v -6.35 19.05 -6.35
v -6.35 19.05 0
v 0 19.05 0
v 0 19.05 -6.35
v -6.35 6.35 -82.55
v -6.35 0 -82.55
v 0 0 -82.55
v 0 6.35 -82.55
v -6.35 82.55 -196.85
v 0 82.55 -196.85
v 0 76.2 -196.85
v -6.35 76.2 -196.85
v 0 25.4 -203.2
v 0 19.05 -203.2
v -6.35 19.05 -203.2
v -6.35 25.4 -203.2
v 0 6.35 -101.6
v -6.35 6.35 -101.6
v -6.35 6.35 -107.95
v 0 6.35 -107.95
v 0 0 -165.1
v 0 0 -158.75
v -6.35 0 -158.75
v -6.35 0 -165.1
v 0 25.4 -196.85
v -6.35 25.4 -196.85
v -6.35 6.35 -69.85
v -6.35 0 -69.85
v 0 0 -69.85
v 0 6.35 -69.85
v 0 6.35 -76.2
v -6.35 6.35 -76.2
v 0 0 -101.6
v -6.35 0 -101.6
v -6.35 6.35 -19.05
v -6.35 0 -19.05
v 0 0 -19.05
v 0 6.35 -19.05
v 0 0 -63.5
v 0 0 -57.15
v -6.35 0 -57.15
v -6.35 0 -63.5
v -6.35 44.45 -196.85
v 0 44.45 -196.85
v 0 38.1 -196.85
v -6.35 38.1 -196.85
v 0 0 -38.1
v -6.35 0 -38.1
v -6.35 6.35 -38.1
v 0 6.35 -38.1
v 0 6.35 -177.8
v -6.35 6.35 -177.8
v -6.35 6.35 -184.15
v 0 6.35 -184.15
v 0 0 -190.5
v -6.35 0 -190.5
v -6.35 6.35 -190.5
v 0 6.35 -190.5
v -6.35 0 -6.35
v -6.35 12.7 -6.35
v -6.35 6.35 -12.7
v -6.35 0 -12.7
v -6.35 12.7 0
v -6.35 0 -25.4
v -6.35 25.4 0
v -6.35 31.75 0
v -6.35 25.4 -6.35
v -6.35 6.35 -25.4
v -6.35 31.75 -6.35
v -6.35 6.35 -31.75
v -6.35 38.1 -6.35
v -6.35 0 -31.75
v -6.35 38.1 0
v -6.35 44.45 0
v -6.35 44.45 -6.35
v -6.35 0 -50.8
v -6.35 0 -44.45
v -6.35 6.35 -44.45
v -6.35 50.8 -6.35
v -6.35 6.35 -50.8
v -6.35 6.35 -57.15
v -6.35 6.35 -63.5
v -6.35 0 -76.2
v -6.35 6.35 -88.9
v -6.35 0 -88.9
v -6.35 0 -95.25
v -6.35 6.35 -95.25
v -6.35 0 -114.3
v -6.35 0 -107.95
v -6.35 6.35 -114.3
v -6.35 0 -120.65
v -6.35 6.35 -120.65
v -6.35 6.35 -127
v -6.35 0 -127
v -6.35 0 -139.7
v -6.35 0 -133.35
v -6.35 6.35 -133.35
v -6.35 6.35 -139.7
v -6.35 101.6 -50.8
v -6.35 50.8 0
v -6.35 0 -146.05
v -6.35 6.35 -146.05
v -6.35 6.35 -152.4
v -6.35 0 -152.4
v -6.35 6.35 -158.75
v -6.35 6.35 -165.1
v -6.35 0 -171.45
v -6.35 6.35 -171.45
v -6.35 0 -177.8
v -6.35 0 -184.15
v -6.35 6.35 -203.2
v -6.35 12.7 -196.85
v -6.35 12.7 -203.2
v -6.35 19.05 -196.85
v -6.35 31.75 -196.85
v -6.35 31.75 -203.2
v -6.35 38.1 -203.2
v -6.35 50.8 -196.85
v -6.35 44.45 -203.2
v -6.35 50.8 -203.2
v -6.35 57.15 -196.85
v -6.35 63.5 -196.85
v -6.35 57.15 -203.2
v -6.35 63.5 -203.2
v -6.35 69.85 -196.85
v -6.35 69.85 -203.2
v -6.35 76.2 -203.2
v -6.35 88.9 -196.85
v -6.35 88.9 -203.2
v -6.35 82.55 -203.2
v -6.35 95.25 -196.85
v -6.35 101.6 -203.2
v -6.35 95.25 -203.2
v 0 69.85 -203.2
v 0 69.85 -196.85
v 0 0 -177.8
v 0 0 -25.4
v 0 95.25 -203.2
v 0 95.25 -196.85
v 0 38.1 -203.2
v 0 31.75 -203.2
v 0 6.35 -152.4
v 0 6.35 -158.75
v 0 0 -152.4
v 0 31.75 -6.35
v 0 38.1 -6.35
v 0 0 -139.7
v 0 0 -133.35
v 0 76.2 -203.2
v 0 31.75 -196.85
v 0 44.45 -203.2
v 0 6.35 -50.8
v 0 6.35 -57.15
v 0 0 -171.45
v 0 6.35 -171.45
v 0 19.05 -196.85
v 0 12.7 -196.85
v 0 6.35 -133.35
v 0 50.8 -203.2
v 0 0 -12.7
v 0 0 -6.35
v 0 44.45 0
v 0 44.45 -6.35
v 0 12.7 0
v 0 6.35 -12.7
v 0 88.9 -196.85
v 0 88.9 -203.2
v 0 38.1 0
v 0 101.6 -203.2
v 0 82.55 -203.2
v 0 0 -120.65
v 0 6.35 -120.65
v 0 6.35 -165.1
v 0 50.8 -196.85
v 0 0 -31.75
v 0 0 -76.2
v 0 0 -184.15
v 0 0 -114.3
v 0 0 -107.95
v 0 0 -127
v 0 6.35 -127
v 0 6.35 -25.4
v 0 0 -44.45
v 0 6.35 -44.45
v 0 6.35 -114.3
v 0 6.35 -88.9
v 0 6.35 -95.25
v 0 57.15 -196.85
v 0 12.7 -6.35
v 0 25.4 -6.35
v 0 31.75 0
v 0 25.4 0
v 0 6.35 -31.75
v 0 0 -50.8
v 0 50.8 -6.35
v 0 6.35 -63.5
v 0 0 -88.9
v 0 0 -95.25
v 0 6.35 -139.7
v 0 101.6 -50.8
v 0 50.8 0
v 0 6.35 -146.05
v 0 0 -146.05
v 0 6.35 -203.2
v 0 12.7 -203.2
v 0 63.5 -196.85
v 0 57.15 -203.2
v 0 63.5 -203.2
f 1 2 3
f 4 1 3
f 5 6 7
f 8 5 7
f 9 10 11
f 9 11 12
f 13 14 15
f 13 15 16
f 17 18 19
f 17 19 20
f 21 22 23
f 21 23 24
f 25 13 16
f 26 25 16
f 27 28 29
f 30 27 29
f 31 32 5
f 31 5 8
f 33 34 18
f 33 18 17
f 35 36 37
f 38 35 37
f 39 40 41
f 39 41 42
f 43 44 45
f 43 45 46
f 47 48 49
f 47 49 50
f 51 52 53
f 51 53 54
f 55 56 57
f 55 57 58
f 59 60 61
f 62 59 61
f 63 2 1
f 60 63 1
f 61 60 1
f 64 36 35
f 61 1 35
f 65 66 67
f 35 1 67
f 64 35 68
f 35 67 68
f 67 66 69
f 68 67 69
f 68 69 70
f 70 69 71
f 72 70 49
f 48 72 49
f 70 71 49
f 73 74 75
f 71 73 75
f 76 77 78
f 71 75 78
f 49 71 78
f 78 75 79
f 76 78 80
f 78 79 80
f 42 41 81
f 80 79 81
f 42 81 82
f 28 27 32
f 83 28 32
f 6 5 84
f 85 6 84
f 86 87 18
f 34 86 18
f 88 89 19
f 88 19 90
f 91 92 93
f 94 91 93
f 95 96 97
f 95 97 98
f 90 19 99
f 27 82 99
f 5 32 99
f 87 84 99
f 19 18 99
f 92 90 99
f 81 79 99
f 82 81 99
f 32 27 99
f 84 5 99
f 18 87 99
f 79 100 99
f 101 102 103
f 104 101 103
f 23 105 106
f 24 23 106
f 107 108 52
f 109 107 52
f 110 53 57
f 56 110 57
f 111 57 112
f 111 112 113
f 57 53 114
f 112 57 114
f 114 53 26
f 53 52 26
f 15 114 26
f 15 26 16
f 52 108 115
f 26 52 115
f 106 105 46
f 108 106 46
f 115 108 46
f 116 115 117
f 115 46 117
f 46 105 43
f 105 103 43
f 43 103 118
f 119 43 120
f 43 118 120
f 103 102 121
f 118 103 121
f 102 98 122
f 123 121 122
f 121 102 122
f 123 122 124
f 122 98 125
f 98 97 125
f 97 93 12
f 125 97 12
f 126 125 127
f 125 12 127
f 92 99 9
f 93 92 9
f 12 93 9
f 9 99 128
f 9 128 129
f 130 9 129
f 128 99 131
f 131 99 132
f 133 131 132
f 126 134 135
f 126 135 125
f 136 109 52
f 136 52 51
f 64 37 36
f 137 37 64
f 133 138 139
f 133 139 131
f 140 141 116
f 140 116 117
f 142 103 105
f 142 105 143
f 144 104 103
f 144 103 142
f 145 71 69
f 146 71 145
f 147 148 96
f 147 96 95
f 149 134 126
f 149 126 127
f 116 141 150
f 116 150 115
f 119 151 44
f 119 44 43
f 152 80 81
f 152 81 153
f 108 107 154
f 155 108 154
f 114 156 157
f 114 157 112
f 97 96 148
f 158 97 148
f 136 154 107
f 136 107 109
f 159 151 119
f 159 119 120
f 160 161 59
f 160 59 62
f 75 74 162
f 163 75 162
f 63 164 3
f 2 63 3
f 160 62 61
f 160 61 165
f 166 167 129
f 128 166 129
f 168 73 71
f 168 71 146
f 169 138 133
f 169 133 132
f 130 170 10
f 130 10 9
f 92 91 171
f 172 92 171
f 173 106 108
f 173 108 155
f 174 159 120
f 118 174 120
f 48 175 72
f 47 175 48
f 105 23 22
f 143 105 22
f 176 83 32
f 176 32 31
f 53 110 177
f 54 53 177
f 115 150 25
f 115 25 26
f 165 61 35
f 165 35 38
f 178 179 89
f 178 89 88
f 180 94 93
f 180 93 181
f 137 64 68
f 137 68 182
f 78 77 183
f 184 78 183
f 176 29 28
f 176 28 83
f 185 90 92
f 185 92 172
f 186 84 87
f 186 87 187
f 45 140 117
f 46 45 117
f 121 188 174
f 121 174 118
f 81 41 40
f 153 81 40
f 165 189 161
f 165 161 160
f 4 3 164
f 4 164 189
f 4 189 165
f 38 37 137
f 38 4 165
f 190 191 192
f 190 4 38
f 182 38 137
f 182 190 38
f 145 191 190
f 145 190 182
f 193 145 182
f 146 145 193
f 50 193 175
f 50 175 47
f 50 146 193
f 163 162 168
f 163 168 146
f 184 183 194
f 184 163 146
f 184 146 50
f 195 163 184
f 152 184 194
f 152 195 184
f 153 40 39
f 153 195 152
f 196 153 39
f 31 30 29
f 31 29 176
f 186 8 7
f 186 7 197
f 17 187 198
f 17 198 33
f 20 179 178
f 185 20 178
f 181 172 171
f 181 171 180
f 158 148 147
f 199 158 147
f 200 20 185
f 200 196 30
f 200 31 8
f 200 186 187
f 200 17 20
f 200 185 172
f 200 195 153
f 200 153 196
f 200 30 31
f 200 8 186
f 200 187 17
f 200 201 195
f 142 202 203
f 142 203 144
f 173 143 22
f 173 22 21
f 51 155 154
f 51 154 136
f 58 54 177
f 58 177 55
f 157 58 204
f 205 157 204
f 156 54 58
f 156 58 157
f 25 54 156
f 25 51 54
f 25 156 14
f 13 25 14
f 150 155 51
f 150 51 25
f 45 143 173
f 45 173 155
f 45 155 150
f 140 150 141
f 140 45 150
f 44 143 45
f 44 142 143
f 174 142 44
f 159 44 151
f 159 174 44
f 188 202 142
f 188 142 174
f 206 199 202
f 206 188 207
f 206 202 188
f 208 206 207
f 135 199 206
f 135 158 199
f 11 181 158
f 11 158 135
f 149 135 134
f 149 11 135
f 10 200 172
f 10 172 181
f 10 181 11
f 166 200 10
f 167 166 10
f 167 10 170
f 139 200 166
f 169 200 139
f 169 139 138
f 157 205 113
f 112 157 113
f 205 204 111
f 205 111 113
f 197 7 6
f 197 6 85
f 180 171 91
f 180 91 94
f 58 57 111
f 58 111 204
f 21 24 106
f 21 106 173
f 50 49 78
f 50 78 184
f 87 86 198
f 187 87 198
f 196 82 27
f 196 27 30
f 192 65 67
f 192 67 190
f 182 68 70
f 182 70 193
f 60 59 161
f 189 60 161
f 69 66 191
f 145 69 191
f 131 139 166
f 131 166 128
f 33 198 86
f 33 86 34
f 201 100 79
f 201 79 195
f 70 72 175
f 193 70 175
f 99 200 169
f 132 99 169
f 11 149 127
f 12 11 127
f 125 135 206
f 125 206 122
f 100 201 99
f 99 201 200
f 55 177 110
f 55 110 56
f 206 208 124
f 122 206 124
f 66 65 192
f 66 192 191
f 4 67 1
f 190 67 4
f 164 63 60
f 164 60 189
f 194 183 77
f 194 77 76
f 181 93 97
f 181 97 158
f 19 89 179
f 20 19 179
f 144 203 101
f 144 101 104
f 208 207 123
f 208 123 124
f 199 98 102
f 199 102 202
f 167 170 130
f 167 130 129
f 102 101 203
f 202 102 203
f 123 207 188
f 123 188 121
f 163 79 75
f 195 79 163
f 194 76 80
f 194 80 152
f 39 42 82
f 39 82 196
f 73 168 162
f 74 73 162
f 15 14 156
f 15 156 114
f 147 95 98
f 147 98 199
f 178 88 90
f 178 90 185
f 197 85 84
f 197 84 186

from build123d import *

# Parameters (mm, degrees)
SKETCH1_W           = 203.2
SKETCH1_H           = 101.6
BOSS_EXTRUDE1_DEPTH = 6.35
SKETCH2_W           = 6.35
SKETCH2_H           = 12.7
CUT_EXTRUDE1_DEPTH  = 6.35
SKETCH5_W           = 6.35
SKETCH5_H           = 6.35
CUT_EXTRUDE2_DEPTH  = 6.35
LPATTERN1_COUNT     = 15
LPATTERN1_PITCH     = 12.7
SKETCH6_W           = 6.35
SKETCH6_H           = 6.35
CUT_EXTRUDE3_DEPTH  = 6.35
LPATTERN2_COUNT     = 7
LPATTERN2_PITCH     = 12.7
CUT_EXTRUDE4_DEPTH  = 6.35
SKETCH8_W           = 6.35
SKETCH8_H           = 6.35
CUT_EXTRUDE5_DEPTH  = 6.35
SKETCH10_W          = 6.35
SKETCH10_H          = 6.35
CUT_EXTRUDE6_DEPTH  = 6.35
LPATTERN3_COUNT     = 3
LPATTERN3_PITCH     = 12.7


with BuildPart() as part:
    # Sketch1 → Boss-Extrude1 (new body)
    with BuildSketch(Plane(origin=(0, 0, 0), x_dir=(0, 0, -1), z_dir=(1, 0, 0))):
        with Locations((101.6, 50.8)):
            Rectangle(SKETCH1_W, SKETCH1_H)
    extrude(amount=-BOSS_EXTRUDE1_DEPTH)

    # Sketch2 → Cut-Extrude1 (cut)
    with BuildSketch(Plane.XZ):
        with Locations((-3.175, -196.85)):
            Rectangle(SKETCH2_W, SKETCH2_H)
    extrude(amount=-CUT_EXTRUDE1_DEPTH, mode=Mode.SUBTRACT)

    # Sketch5 → Cut-Extrude2 (cut)
    with BuildSketch(Plane.XZ):
        with Locations((-3.175, -180.975)):
            Rectangle(SKETCH5_W, SKETCH5_H)
    cut_extrude2 = extrude(amount=-CUT_EXTRUDE2_DEPTH, mode=Mode.SUBTRACT)

    # LPattern1: Cut-Extrude2 ×15
    with Locations(*[(0, 0, i * LPATTERN1_PITCH) for i in range(1, LPATTERN1_COUNT)]):
        add(cut_extrude2, mode=Mode.SUBTRACT)

    # Sketch6 → Cut-Extrude3 (cut)
    with BuildSketch(Plane(origin=(0, 0, -203.2), x_dir=(-1, 0, 0), z_dir=(0, 0, -1))):
        with Locations((3.175, 15.875)):
            Rectangle(SKETCH6_W, SKETCH6_H)
    cut_extrude3 = extrude(amount=-CUT_EXTRUDE3_DEPTH, mode=Mode.SUBTRACT)

    # LPattern2: Cut-Extrude3 ×7
    with Locations(*[(0, i * LPATTERN2_PITCH, 0) for i in range(1, LPATTERN2_COUNT)]):
        add(cut_extrude3, mode=Mode.SUBTRACT)

    # Sketch7 → Cut-Extrude4 (cut)
    with BuildSketch(Plane(origin=(0, 0, 0), x_dir=(0, 0, -1), z_dir=(1, 0, 0))):
        Polygon((0, 101.6), (0, 50.8), (50.8, 101.6), align=None)
    extrude(amount=-CUT_EXTRUDE4_DEPTH, mode=Mode.SUBTRACT)

    # Sketch8 → Cut-Extrude5 (cut)
    with BuildSketch(Plane.XY):
        with Locations((-3.175, 9.525)):
            Rectangle(SKETCH8_W, SKETCH8_H)
    extrude(amount=-CUT_EXTRUDE5_DEPTH, mode=Mode.SUBTRACT)

    # Sketch10 → Cut-Extrude6 (cut)
    with BuildSketch(Plane.XY):
        with Locations((-3.175, 22.225)):
            Rectangle(SKETCH10_W, SKETCH10_H)
    cut_extrude6 = extrude(amount=-CUT_EXTRUDE6_DEPTH, mode=Mode.SUBTRACT)

    # LPattern3: Cut-Extrude6 ×3
    with Locations(*[(0, i * LPATTERN3_PITCH, 0) for i in range(1, LPATTERN3_COUNT)]):
        add(cut_extrude6, mode=Mode.SUBTRACT)


solid = part.part
